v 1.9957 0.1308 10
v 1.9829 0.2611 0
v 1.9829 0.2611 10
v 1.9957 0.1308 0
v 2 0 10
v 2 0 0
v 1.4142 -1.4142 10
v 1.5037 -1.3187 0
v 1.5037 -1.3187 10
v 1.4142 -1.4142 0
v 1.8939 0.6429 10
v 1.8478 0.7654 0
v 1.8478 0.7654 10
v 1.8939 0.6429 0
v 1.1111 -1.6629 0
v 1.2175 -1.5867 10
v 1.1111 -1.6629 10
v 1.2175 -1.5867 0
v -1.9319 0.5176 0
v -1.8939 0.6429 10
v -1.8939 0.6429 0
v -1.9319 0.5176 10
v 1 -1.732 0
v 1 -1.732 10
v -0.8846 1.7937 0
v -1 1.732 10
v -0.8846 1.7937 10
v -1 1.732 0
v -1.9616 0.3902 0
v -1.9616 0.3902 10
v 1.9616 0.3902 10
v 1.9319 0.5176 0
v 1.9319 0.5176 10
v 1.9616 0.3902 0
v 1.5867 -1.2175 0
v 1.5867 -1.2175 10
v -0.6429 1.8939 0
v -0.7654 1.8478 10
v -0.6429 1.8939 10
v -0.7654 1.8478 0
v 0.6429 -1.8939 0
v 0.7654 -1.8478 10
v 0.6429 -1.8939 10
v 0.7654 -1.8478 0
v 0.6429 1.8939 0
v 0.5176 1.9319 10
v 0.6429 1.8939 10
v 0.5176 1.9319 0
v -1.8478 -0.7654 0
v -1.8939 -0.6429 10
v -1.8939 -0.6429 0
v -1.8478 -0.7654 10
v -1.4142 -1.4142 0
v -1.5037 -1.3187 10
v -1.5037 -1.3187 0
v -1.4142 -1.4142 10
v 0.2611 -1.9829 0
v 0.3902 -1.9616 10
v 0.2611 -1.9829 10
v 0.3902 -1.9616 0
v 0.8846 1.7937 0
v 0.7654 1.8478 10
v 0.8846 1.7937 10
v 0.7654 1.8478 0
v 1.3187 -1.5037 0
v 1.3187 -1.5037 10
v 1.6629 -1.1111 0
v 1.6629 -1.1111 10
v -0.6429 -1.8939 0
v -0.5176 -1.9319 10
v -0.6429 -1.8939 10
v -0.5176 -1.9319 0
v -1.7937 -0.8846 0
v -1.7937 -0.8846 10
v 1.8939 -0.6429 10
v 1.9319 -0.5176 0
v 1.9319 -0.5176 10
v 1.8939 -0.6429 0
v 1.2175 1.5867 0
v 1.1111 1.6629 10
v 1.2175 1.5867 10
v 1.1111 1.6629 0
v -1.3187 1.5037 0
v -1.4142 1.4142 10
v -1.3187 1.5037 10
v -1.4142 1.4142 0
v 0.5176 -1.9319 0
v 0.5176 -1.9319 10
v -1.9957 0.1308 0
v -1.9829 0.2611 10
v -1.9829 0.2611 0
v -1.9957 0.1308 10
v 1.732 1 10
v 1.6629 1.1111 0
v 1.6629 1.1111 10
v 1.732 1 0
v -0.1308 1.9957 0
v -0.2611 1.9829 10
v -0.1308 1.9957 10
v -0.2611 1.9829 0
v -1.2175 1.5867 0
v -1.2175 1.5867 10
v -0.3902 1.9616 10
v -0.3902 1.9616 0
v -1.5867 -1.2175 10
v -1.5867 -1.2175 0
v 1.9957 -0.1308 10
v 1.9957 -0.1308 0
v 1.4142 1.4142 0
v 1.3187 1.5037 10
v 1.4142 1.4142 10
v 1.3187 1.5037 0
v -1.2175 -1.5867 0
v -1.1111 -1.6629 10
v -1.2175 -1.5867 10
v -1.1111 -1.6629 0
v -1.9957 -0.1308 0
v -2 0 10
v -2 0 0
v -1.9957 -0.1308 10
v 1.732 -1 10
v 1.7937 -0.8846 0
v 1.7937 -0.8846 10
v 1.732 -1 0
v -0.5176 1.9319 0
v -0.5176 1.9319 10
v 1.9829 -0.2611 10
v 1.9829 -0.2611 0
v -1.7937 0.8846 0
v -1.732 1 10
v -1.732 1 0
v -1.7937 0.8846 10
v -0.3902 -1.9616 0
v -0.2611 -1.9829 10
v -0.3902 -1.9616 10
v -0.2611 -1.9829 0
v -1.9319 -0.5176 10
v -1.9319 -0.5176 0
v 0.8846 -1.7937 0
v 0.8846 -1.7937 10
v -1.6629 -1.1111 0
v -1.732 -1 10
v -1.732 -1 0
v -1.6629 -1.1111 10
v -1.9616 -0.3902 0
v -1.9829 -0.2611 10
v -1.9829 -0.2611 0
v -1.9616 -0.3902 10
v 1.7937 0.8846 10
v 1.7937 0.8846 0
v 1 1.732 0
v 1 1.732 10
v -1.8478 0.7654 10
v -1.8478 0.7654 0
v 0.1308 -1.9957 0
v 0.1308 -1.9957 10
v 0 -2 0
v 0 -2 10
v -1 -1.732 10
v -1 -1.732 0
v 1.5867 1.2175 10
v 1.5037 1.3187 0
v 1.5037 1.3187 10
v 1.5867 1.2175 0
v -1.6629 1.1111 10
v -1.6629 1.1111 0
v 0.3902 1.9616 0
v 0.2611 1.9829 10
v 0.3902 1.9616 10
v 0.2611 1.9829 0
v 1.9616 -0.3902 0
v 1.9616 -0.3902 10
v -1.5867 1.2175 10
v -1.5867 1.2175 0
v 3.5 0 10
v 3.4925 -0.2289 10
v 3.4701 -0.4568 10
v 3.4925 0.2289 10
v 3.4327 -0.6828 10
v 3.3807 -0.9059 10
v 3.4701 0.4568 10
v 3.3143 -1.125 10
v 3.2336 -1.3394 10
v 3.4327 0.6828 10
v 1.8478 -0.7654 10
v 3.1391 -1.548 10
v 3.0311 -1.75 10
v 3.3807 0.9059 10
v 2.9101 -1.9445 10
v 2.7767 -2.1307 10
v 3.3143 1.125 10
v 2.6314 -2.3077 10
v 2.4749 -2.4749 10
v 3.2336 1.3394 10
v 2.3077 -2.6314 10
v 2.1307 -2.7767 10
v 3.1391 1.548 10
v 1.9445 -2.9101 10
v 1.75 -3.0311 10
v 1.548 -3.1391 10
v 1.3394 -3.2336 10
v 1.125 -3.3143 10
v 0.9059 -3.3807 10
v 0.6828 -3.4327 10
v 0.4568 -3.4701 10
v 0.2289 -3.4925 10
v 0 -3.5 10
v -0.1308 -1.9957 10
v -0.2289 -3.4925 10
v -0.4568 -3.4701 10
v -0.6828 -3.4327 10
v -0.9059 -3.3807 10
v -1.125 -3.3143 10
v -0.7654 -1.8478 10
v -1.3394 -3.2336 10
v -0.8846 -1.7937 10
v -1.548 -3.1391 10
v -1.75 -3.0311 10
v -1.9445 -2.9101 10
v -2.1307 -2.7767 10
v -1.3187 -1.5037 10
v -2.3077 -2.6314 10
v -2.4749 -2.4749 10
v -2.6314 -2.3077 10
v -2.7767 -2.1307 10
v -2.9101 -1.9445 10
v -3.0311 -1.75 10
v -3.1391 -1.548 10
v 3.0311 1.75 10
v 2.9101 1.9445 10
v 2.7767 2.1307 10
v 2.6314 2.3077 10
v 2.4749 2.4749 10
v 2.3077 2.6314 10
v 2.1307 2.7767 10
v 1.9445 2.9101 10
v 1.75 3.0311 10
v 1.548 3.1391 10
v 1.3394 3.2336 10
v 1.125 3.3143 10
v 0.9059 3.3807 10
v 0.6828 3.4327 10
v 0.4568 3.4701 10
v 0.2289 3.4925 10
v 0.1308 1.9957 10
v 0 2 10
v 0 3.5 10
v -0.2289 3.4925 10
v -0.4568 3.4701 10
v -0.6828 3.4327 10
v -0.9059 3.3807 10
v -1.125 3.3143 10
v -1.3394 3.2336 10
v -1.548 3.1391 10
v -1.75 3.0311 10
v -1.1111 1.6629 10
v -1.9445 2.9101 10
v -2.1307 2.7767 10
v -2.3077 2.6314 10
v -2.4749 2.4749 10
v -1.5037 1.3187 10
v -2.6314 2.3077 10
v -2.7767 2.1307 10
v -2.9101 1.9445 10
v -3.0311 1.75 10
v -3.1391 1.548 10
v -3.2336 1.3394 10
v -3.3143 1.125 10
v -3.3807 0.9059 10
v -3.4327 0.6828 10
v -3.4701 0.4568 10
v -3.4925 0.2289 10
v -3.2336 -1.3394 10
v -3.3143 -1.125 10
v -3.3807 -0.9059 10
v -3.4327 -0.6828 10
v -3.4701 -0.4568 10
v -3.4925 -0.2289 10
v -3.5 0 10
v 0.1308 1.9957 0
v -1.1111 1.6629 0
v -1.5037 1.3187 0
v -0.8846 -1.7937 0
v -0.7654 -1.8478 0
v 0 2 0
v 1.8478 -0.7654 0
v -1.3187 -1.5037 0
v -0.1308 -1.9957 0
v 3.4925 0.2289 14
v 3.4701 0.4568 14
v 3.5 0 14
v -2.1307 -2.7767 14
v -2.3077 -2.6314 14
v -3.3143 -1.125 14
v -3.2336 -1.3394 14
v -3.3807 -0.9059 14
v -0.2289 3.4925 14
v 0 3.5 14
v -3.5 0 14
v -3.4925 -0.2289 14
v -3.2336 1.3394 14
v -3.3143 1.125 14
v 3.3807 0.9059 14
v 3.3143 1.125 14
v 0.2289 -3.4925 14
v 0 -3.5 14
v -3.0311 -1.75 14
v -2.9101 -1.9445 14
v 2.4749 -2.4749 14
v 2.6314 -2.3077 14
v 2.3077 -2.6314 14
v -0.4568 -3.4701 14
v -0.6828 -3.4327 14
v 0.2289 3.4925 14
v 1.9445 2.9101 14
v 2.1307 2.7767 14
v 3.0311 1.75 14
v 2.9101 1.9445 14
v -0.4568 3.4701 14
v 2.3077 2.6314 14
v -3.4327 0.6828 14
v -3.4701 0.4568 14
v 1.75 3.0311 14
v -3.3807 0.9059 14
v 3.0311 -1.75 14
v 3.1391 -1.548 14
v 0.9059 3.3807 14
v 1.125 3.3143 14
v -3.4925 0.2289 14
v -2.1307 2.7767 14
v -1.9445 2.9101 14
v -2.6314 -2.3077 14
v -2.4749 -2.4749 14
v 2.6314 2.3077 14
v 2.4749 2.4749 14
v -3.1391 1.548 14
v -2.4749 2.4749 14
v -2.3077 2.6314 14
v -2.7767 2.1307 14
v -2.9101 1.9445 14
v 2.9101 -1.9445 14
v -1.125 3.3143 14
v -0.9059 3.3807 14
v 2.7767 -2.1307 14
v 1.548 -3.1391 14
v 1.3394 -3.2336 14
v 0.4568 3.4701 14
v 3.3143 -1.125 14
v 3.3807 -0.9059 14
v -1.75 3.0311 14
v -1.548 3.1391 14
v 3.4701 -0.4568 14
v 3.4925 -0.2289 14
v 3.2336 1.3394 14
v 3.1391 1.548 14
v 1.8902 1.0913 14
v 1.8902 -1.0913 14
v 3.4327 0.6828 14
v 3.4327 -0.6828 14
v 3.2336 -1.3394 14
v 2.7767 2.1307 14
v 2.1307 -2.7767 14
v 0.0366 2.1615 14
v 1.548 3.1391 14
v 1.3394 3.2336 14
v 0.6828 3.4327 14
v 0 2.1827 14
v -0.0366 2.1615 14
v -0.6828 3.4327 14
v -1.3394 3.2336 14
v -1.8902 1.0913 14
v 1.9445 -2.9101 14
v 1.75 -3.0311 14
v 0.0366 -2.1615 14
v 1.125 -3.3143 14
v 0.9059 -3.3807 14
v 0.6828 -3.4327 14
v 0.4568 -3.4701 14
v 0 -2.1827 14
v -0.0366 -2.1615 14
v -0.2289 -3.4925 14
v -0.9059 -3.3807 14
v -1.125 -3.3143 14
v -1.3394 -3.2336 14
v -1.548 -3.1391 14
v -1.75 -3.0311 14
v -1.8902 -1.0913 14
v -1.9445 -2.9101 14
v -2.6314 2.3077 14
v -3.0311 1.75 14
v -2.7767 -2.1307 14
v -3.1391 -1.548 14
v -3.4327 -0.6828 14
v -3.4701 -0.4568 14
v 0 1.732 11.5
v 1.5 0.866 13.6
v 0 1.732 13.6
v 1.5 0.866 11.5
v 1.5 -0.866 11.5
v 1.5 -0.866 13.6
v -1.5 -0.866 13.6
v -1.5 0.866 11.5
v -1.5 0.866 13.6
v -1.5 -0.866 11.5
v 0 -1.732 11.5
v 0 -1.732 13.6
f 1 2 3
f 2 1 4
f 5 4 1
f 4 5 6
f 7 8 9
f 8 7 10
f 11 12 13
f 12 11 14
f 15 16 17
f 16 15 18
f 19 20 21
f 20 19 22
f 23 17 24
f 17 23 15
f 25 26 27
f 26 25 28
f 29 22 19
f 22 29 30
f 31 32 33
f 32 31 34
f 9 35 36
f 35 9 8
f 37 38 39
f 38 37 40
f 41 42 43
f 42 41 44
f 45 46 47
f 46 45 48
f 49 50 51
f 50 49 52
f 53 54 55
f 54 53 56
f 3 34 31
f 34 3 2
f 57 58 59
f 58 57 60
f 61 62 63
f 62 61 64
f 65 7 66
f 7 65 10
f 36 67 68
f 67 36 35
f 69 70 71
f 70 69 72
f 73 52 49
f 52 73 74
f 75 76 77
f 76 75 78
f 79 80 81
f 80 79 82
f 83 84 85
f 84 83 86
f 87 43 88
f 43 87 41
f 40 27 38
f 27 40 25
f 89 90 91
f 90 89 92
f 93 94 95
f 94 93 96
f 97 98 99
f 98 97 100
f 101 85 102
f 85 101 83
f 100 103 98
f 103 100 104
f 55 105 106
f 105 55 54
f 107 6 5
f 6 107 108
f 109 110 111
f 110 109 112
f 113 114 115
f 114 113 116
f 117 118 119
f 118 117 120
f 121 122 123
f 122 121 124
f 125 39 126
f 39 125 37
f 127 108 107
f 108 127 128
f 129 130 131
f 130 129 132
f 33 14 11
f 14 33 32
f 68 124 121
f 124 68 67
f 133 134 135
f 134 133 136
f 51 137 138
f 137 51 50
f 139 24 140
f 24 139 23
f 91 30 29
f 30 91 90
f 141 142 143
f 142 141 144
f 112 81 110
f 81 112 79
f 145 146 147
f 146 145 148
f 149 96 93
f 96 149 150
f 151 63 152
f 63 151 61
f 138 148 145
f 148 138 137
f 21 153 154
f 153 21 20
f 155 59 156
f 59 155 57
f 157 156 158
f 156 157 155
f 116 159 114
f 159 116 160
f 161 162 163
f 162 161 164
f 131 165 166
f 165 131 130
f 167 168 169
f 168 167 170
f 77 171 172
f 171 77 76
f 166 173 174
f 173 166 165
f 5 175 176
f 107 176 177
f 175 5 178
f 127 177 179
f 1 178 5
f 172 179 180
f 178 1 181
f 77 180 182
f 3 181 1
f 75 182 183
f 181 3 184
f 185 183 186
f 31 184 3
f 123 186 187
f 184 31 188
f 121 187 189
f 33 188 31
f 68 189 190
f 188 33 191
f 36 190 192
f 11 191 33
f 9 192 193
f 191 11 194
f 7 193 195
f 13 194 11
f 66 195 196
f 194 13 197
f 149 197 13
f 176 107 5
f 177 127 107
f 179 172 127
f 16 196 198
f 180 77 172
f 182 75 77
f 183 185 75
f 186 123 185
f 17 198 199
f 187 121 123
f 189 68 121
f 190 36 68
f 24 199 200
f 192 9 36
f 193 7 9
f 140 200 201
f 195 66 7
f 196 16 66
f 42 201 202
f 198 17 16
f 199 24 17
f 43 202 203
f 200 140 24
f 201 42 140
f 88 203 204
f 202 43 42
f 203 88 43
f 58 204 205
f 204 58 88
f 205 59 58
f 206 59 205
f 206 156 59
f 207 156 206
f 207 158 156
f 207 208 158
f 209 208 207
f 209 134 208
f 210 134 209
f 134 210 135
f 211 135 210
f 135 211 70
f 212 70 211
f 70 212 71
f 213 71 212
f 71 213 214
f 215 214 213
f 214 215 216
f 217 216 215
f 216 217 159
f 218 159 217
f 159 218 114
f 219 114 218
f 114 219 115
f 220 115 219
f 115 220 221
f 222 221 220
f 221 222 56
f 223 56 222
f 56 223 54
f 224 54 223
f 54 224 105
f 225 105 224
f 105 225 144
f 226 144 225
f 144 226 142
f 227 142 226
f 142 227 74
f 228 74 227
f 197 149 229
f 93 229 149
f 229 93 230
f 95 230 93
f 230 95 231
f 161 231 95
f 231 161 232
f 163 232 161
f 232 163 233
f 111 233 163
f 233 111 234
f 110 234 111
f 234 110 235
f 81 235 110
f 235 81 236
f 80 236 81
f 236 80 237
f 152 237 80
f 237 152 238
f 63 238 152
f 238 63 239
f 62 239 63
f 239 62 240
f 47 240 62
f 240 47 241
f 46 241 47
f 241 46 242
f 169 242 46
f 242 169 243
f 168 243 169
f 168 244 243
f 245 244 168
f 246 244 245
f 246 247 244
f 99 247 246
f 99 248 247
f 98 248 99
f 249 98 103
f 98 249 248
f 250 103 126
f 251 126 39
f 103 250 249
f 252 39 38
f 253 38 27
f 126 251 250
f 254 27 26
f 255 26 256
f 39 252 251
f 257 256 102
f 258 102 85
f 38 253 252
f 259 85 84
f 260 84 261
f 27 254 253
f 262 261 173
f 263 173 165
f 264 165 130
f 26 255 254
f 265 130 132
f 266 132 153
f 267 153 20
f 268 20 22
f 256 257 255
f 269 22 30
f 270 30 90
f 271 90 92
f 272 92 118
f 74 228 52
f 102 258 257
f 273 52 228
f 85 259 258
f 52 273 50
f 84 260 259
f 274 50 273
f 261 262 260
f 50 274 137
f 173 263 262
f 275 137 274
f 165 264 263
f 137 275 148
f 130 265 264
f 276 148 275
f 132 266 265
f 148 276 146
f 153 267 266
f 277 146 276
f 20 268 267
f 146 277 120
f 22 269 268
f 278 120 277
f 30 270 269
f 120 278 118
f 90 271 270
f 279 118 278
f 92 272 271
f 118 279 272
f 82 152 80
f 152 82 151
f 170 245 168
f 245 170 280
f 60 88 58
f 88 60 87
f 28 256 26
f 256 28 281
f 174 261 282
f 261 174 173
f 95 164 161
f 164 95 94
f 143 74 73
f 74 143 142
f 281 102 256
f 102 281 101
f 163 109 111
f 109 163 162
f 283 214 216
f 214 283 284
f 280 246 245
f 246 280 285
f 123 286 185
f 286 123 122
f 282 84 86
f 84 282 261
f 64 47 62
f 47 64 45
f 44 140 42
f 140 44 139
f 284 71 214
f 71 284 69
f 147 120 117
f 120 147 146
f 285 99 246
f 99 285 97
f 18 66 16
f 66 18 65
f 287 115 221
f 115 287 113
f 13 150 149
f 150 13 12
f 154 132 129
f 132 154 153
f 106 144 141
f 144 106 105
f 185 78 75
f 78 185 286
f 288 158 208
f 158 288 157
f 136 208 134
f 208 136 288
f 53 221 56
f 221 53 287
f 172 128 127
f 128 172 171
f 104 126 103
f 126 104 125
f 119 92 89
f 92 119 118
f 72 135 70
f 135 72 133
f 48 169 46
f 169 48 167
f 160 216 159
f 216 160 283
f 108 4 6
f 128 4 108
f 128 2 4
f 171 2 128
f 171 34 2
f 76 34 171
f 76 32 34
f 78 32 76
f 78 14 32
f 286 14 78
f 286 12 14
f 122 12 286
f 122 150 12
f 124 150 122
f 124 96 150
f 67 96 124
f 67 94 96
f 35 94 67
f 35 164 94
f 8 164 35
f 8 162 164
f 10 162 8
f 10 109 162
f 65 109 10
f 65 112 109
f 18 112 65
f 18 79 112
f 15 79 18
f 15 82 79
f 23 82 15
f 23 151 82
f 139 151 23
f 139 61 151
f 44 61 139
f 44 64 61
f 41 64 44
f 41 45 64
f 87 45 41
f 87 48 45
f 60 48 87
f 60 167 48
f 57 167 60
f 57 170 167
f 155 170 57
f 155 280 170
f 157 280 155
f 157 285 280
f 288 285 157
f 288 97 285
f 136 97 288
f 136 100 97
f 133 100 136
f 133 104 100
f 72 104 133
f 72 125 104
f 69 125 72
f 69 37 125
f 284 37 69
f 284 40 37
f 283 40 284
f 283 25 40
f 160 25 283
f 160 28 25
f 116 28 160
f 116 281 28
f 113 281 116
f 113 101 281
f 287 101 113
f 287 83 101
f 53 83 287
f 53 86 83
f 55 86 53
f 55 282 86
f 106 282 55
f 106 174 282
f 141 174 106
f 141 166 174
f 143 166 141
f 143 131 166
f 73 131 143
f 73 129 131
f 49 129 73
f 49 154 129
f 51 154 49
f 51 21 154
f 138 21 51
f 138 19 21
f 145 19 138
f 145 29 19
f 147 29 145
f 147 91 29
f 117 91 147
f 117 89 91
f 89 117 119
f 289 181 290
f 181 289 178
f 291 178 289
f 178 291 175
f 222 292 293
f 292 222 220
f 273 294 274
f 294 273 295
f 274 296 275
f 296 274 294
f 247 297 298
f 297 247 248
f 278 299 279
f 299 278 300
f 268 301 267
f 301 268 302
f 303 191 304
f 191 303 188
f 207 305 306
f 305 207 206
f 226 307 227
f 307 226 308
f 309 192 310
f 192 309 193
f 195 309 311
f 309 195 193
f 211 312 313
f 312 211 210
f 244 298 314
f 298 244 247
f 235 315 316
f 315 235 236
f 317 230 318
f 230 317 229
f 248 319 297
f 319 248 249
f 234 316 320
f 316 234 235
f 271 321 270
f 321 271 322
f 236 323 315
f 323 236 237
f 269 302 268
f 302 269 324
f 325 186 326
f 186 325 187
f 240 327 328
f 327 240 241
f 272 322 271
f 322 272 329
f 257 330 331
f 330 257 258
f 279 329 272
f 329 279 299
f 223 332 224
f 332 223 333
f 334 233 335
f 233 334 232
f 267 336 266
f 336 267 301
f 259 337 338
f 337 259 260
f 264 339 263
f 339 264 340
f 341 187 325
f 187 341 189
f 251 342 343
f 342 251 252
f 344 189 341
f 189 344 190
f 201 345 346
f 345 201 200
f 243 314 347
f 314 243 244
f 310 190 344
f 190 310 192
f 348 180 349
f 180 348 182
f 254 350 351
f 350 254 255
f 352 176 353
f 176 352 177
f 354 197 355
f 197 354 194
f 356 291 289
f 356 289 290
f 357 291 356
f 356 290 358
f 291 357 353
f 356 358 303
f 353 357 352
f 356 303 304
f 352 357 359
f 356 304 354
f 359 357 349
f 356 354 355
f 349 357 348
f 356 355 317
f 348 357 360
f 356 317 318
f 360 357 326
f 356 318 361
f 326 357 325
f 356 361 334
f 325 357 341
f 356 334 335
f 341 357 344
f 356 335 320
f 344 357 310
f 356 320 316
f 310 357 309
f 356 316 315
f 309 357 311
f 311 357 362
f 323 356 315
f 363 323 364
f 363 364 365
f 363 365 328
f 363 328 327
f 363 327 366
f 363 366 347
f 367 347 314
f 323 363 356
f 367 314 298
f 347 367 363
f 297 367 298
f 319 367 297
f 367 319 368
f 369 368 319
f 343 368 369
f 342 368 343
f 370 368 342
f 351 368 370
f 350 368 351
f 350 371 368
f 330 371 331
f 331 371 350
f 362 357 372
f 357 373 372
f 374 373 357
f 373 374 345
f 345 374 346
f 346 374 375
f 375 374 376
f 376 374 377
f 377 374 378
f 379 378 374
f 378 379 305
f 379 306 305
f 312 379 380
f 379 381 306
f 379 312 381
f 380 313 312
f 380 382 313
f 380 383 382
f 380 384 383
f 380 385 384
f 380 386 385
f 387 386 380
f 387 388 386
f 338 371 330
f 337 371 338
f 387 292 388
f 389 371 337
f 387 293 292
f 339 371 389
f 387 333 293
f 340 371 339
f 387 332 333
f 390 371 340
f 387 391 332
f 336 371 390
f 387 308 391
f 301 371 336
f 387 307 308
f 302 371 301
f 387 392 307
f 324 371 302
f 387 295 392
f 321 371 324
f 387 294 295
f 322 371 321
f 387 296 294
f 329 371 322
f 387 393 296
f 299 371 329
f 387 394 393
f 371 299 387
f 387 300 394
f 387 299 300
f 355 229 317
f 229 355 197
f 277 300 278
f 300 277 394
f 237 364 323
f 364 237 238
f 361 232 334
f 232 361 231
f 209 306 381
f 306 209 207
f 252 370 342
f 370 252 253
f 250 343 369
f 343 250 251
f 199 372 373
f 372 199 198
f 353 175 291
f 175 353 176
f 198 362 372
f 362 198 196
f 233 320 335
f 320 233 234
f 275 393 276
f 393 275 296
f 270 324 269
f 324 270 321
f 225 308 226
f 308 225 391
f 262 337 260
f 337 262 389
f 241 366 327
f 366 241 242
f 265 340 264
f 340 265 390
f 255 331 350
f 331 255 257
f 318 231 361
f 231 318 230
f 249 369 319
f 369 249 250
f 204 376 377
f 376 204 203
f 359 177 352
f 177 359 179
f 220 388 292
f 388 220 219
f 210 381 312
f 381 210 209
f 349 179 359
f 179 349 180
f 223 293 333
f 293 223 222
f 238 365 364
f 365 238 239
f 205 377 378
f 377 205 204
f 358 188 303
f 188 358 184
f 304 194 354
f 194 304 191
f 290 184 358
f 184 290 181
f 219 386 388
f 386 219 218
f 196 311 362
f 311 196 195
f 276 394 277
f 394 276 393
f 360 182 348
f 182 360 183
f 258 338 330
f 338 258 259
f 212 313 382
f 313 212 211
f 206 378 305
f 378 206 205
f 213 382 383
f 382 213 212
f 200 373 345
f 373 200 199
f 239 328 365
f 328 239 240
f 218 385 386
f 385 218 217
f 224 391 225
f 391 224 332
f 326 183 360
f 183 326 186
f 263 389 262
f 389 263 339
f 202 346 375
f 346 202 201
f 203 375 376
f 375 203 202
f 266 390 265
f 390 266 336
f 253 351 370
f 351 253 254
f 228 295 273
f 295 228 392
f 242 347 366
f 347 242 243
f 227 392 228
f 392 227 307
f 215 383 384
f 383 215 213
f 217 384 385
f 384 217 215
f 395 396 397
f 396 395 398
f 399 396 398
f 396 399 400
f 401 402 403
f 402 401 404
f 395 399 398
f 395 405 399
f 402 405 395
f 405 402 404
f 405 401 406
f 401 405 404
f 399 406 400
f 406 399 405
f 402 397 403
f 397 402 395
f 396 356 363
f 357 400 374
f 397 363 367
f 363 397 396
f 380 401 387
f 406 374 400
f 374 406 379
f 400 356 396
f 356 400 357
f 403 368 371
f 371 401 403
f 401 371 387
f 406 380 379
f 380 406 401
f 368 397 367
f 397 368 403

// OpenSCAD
$fn = 96;

module metric_socket_head_cap_screw(
    shank_d = 4.0,
    length  = 10.0,   // under-head length
    head_d  = 7.0,
    head_h  = 4.0,
    socket_af = 3.0,  // across flats (approx for M4)
    socket_depth = 2.5,
    socket_chamfer = 0.4
) {
    // One connected solid: head + shank, with socket subtracted from head
    difference() {
        union() {
            // Shank: z = 0 .. length
            cylinder(h = length, d = shank_d, center = false);

            // Head: sits on top of shank, z = length .. length+head_h
            translate([0, 0, length])
                cylinder(h = head_h, d = head_d, center = false);
        }

        // Hex/Allen socket cut into head from the top
        translate([0, 0, length + head_h])
            hex_socket_cut(af = socket_af, depth = socket_depth, chamfer = socket_chamfer);
    }
}

module hex_socket_cut(af, depth, chamfer) {
    // Cut downward from z=0 (top surface) into the head
    // Includes a small entry chamfer for a more realistic socket
    union() {
        // Main hex pocket
        translate([0, 0, -depth])
            linear_extrude(height = depth + 0.01)
                polygon(points = hex_points_from_af(af));

        // Entry chamfer (slight taper)
        translate([0, 0, -chamfer])
            linear_extrude(height = chamfer + 0.01, scale = (af + 2*chamfer)/af)
                polygon(points = hex_points_from_af(af));
    }
}

function hex_points_from_af(af) =
    let(R = af / sqrt(3))  // circumradius from across-flats
    [ for (i = [0:5]) [ R * cos(30 + i*60), R * sin(30 + i*60) ] ];

metric_socket_head_cap_screw();
